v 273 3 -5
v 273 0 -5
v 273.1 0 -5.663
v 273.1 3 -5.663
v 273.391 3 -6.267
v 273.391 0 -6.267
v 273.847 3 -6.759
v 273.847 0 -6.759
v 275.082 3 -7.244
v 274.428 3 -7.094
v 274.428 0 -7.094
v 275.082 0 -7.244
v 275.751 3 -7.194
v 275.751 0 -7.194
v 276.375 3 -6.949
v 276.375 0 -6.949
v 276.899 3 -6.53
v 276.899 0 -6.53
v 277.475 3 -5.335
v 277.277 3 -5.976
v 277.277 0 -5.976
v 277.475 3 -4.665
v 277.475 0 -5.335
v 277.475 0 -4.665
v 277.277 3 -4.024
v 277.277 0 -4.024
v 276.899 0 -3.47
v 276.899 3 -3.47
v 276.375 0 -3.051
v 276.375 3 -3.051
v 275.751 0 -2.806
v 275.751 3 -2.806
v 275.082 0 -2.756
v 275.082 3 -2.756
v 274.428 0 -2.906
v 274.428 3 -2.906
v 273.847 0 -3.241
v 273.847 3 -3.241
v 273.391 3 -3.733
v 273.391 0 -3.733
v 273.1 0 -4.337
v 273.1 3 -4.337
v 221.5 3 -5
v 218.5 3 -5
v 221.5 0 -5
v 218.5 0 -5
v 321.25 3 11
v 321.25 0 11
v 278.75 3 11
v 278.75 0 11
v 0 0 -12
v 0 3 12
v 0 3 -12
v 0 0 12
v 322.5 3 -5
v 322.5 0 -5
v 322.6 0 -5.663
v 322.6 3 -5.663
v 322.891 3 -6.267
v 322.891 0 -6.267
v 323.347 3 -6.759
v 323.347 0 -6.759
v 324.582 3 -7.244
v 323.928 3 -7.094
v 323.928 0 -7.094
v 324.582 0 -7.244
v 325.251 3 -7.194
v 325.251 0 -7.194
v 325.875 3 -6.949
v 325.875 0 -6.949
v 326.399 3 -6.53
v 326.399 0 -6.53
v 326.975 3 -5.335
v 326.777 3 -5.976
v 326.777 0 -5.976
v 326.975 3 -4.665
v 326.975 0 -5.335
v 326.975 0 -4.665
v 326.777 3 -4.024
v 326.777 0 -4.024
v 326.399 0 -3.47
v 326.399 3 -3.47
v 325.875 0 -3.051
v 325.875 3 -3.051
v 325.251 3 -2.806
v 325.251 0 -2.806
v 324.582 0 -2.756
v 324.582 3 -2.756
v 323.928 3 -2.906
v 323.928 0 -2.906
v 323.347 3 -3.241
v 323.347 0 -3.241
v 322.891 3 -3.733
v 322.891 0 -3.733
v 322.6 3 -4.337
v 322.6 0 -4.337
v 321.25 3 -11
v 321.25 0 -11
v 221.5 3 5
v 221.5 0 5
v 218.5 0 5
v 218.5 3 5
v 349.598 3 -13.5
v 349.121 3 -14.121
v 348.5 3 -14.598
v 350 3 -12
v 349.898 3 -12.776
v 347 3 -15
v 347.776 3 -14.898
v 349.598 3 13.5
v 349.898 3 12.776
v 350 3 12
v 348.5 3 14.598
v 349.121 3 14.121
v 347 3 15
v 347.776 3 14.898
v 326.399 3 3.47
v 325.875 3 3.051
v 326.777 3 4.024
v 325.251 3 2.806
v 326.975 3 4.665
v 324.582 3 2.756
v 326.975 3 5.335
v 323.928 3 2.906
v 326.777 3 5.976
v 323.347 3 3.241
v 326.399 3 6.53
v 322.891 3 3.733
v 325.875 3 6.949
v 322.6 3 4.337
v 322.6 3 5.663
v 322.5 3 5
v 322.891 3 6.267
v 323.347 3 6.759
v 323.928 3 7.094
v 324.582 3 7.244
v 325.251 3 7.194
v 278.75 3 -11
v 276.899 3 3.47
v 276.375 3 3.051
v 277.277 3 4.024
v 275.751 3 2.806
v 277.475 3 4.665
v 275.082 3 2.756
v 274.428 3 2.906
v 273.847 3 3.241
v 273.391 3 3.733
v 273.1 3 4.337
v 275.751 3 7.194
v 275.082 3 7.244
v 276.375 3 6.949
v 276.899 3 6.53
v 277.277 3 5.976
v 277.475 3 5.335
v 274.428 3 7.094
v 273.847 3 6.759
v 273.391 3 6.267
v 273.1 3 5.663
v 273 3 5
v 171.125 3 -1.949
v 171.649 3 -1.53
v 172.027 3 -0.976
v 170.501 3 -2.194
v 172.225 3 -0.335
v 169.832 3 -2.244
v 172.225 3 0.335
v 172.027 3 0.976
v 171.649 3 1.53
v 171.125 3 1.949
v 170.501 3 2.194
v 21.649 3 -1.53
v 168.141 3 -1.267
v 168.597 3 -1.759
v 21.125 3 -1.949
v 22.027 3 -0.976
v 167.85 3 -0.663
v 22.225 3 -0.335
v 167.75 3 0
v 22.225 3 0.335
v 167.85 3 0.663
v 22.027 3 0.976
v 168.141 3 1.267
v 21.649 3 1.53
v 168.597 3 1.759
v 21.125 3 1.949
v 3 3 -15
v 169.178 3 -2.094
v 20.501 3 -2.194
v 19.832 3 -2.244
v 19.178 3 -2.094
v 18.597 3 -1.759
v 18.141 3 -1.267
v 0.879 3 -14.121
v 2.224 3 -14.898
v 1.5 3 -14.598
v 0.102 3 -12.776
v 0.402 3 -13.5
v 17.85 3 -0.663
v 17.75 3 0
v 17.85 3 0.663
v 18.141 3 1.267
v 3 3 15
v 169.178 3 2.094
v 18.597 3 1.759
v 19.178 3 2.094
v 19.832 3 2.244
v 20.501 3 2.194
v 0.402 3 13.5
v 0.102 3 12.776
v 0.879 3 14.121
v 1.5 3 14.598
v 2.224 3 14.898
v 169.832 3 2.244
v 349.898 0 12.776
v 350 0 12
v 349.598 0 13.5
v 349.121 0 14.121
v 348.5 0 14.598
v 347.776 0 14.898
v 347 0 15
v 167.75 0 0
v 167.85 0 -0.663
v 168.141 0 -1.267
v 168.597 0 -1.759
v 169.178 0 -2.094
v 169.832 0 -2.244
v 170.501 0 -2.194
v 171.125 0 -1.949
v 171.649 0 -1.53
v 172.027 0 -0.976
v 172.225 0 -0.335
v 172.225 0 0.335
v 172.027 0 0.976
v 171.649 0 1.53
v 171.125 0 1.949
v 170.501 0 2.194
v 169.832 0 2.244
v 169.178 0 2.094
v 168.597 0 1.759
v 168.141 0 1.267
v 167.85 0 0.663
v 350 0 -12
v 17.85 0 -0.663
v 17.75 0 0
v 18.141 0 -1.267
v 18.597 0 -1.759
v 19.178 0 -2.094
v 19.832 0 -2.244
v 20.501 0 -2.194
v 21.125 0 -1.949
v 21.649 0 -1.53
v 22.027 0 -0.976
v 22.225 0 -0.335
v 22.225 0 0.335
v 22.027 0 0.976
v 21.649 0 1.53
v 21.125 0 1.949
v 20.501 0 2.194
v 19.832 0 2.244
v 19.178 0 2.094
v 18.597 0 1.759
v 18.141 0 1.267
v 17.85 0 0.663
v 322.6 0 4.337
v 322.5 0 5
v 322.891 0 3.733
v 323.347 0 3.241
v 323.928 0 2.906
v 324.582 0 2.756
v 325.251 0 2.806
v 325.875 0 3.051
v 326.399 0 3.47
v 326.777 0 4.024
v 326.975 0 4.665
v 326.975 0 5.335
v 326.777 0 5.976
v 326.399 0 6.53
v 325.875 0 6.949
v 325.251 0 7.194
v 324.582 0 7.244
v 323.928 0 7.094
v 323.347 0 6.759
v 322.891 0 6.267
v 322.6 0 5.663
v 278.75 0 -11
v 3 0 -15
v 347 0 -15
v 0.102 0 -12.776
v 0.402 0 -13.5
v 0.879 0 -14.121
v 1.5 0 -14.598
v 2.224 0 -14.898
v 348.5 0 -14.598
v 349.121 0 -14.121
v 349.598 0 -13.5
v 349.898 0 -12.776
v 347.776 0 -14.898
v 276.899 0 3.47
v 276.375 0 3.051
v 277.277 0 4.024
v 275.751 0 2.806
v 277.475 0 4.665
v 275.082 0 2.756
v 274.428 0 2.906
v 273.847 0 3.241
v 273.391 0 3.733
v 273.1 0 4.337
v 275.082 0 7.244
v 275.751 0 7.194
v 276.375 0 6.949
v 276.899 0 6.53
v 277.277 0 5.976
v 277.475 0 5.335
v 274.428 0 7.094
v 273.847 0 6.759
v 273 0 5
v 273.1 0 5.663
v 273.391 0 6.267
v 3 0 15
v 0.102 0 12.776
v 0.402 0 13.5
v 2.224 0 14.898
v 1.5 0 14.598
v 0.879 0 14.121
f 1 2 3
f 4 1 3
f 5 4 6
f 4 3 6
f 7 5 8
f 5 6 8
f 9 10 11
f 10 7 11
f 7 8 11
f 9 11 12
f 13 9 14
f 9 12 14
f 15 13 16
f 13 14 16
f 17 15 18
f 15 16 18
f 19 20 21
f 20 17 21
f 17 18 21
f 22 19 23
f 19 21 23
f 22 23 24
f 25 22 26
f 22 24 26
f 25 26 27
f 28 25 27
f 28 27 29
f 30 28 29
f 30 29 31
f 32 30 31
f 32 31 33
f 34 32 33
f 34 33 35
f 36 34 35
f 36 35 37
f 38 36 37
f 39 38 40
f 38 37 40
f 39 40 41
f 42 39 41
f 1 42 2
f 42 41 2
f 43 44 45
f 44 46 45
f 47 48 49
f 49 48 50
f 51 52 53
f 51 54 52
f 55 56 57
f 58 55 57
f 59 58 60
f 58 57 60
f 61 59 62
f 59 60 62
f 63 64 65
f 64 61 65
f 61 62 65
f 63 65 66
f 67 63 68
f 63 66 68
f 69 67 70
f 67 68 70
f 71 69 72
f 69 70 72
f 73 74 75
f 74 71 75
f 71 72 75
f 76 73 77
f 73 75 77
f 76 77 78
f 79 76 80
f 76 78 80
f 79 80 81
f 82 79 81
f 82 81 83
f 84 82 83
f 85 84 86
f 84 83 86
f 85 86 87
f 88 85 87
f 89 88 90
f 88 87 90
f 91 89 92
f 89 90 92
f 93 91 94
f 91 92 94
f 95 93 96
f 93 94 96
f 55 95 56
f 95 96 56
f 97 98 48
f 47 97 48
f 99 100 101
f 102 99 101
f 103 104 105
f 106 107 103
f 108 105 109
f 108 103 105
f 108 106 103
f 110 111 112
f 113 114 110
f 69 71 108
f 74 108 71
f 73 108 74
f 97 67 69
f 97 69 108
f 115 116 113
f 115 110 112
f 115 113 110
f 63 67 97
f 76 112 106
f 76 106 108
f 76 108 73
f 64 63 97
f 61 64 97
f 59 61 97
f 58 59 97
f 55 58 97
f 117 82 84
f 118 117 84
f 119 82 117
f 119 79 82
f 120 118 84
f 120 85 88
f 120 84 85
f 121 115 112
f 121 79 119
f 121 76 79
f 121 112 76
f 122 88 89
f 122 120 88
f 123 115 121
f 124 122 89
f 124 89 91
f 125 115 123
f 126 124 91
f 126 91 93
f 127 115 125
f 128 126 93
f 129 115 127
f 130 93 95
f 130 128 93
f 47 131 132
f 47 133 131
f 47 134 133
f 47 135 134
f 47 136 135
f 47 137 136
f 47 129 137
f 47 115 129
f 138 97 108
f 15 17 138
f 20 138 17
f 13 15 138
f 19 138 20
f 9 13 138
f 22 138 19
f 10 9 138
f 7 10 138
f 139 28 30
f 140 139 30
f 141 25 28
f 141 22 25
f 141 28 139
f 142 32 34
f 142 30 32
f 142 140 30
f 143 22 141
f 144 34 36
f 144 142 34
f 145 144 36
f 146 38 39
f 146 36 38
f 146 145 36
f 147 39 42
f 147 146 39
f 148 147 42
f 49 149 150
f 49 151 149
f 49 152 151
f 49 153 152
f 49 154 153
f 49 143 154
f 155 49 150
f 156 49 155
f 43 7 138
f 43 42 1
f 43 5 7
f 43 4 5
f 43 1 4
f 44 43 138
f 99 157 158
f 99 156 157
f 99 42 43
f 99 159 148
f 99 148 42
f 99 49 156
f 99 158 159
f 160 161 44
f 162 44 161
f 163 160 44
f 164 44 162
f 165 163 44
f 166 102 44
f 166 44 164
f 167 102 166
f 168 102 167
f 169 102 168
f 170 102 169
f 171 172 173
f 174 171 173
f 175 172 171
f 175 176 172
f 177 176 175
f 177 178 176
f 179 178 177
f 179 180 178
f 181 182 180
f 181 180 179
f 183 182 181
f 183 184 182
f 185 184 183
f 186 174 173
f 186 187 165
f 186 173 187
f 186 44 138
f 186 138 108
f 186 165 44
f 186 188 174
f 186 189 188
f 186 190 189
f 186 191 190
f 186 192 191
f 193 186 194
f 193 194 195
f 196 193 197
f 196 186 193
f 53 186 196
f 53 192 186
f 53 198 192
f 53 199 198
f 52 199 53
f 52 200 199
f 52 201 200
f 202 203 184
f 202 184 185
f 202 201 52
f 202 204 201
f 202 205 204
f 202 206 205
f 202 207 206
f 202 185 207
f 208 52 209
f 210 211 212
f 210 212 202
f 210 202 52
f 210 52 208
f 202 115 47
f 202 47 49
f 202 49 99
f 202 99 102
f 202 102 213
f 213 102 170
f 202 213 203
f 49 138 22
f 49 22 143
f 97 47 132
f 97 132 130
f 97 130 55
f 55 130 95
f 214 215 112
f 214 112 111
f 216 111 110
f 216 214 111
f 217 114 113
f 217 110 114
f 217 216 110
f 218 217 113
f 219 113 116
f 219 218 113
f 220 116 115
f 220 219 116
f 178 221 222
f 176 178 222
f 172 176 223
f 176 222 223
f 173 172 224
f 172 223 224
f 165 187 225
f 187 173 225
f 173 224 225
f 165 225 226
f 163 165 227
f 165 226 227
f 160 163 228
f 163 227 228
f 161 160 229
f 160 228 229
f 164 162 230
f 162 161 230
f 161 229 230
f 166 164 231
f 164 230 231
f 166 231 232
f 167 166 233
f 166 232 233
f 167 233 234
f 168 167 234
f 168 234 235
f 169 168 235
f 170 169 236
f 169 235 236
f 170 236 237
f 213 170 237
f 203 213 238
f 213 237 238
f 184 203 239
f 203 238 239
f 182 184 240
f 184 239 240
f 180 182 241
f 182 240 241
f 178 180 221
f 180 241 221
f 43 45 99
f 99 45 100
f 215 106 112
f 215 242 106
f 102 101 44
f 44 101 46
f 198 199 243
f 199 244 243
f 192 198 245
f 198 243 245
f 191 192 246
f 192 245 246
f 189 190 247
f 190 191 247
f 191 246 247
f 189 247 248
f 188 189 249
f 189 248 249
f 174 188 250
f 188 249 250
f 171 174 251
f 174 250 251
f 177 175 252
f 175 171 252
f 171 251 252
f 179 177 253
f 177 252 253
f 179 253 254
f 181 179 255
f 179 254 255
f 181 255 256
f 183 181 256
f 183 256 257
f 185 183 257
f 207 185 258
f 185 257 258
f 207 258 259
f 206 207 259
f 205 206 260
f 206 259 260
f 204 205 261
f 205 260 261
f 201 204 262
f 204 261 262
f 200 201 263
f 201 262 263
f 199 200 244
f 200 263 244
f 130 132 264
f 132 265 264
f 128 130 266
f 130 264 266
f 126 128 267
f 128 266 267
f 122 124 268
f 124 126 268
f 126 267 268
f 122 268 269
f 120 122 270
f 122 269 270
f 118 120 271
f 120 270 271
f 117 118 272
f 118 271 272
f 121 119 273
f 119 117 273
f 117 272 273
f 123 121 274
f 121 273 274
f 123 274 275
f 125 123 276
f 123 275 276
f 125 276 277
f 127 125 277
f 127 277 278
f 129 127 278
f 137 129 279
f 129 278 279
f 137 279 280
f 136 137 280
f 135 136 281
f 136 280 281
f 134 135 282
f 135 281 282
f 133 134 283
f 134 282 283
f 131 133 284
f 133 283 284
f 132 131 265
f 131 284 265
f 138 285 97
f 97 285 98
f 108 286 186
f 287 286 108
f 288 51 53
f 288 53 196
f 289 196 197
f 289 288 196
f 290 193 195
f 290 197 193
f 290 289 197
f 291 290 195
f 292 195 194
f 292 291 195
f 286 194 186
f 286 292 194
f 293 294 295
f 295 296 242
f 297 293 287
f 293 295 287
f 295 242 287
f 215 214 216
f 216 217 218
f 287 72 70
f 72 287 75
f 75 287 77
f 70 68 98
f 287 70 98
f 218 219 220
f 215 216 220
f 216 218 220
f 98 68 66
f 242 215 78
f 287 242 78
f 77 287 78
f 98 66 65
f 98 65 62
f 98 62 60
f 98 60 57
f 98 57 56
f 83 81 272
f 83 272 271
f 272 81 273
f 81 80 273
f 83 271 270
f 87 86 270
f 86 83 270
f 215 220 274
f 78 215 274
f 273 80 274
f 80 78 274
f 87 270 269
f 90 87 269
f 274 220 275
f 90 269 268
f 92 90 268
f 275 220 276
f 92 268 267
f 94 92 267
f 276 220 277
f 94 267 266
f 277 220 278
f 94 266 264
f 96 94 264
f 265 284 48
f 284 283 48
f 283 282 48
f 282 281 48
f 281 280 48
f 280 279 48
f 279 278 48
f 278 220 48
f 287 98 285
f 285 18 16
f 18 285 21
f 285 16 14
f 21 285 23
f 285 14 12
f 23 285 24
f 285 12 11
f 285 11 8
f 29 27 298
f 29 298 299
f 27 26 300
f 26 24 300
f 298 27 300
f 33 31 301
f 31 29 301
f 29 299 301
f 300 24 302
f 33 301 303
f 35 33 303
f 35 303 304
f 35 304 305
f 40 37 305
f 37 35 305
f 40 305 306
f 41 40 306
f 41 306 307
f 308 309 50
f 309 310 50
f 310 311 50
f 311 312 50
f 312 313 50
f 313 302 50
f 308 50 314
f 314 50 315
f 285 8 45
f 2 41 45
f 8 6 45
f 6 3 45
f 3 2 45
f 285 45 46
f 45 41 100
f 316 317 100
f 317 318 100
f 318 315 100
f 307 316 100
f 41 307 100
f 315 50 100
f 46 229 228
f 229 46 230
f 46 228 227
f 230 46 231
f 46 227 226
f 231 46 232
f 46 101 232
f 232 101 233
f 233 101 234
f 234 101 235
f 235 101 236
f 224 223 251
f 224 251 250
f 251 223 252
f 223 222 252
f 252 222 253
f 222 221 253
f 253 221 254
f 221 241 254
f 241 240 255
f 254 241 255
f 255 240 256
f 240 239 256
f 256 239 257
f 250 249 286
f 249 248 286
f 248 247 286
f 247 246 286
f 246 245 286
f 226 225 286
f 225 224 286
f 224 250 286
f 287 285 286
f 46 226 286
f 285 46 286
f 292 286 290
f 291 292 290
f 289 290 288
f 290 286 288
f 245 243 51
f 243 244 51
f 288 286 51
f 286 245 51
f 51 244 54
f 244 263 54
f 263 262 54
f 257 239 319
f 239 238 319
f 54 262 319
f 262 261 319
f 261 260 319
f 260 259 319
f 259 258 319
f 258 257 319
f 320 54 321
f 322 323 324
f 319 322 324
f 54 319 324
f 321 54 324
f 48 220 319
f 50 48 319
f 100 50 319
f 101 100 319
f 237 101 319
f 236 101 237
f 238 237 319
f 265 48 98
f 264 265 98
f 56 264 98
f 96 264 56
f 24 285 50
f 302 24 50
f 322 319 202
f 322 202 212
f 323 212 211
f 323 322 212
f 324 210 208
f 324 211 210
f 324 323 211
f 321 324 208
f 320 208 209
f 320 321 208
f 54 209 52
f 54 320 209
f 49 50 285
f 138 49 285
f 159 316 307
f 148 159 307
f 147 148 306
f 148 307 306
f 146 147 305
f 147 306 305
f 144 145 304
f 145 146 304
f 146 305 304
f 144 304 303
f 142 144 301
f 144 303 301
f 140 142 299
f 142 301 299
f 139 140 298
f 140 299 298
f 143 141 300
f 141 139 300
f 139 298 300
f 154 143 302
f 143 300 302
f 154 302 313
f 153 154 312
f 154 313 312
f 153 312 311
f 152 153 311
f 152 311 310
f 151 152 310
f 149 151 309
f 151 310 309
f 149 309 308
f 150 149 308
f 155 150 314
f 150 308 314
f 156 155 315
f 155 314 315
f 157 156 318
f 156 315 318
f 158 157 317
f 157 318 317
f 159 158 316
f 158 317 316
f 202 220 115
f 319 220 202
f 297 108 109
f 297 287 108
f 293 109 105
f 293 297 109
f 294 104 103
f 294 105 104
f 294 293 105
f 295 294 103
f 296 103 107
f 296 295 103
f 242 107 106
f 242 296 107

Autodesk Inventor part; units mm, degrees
ref_plane "YZ Plane" through (0, 0, 0) normal (1, 0, 0) x (0, 1, 0)
ref_plane "XZ Plane" through (0, 0, 0) normal (0, 1, 0) x (-1, 0, 0)
ref_plane "XY Plane" through (0, 0, 0) normal (0, 0, 1) x (1, 0, 0)
sketch "Sketch1" plane through (0, 0, 0) normal (0, 1, 0) x (-1, 0, 0)
  line L0 (-3, -15) -> (-347, -15)
  line L1 (-350, -12) -> (-350, 12)
  line L2 (-347, 15) -> (-3, 15)
  line L3 (0, 12) -> (0, -12)
  line L4 (0, 0) -> (-350, 0) construction
  circle A0 centre (-20, 0) radius 2.25
  circle A1 centre (-170, 0) radius 2.25
  line L5 (-278.75, -11) -> (-321.25, -11)
  line L6 (-321.25, -11) -> (-321.25, 11)
  line L7 (-321.25, 11) -> (-278.75, 11)
  line L8 (-278.75, 11) -> (-278.75, -11)
  line L9 (-278.75, 0) -> (-321.25, 0) construction
  line L10 (-278.75, -2.5) -> (-278.75, 2.5)
  line L11 (-275.25, 5) -> (-324.75, 5) construction
  line L12 (-324.75, 5) -> (-324.75, -5) construction
  line L13 (-324.75, -5) -> (-275.25, -5) construction
  line L14 (-275.25, -5) -> (-275.25, 5) construction
  line L15 (-324.75, 5) -> (-275.25, -5) construction
  line L16 (-324.75, -5) -> (-275.25, 5) construction
  circle A2 centre (-275.25, -5) radius 2.25
  circle A3 centre (-275.25, 5) radius 2.25
  circle A4 centre (-324.75, -5) radius 2.25
  circle A5 centre (-324.75, 5) radius 2.25
  arc A6 (-3, -15) -> (0, -12) centre (-3, -12) ccw
  arc A7 (0, 12) -> (-3, 15) centre (-3, 12) ccw
  arc A8 (-347, 15) -> (-350, 12) centre (-347, 12) ccw
  arc A9 (-350, -12) -> (-347, -15) centre (-347, -12) ccw
  point P0 (0, -15)
  point P1 (-350, 15)
  point P2 (-350, -15)
  point P3 (0, 15)
  point P4 (-305.045, 0)
  point P5 (-300, 0)
  dimension "d0" = 350
  dimension "d1" = 30
  dimension "d3" = 20
  dimension "d5" = 150
  dimension "d6" = 22
  dimension "d7" = 42.5
  dimension "d8" = 300
  dimension "d10" = 5
  dimension "d13" = 10
  dimension "d14" = 49.5
  dimension "d15" = 2.25
  dimension "d16" = 2.25
  dimension "d17" = 2.25
  dimension "d18" = 2.25
  dimension "d21" = 3
  dimension "d22" = 4.5
  dimension "d23" = 4.5
extrude "Extrusion1" add sketch "Sketch1" along normal blind 3
sketch "Sketch2" plane through (0, 0, 0) normal (0, -1, 0) x (1, 0, 0)
  line L0 (221.5, 5) -> (218.5, 5)
  line L1 (218.5, 5) -> (218.5, -5)
  line L2 (218.5, -5) -> (221.5, -5)
  line L3 (221.5, -5) -> (221.5, 5)
  line L4 (221.5, 5) -> (218.5, -5) construction
  line L5 (218.5, 5) -> (221.5, -5) construction
  line L6 (0, -12) -> (0, 12) projected
  point P0 (0, 0)
  point P1 (220, 0)
  point P2 (220, 0)
  point P3 (0, 0)
  dimension "d24" = 3
  dimension "d25" = 10
  dimension "d26" = 220
extrude "Extrusion2" cut sketch "Sketch2" against normal blind 10
properties part number "extension"
